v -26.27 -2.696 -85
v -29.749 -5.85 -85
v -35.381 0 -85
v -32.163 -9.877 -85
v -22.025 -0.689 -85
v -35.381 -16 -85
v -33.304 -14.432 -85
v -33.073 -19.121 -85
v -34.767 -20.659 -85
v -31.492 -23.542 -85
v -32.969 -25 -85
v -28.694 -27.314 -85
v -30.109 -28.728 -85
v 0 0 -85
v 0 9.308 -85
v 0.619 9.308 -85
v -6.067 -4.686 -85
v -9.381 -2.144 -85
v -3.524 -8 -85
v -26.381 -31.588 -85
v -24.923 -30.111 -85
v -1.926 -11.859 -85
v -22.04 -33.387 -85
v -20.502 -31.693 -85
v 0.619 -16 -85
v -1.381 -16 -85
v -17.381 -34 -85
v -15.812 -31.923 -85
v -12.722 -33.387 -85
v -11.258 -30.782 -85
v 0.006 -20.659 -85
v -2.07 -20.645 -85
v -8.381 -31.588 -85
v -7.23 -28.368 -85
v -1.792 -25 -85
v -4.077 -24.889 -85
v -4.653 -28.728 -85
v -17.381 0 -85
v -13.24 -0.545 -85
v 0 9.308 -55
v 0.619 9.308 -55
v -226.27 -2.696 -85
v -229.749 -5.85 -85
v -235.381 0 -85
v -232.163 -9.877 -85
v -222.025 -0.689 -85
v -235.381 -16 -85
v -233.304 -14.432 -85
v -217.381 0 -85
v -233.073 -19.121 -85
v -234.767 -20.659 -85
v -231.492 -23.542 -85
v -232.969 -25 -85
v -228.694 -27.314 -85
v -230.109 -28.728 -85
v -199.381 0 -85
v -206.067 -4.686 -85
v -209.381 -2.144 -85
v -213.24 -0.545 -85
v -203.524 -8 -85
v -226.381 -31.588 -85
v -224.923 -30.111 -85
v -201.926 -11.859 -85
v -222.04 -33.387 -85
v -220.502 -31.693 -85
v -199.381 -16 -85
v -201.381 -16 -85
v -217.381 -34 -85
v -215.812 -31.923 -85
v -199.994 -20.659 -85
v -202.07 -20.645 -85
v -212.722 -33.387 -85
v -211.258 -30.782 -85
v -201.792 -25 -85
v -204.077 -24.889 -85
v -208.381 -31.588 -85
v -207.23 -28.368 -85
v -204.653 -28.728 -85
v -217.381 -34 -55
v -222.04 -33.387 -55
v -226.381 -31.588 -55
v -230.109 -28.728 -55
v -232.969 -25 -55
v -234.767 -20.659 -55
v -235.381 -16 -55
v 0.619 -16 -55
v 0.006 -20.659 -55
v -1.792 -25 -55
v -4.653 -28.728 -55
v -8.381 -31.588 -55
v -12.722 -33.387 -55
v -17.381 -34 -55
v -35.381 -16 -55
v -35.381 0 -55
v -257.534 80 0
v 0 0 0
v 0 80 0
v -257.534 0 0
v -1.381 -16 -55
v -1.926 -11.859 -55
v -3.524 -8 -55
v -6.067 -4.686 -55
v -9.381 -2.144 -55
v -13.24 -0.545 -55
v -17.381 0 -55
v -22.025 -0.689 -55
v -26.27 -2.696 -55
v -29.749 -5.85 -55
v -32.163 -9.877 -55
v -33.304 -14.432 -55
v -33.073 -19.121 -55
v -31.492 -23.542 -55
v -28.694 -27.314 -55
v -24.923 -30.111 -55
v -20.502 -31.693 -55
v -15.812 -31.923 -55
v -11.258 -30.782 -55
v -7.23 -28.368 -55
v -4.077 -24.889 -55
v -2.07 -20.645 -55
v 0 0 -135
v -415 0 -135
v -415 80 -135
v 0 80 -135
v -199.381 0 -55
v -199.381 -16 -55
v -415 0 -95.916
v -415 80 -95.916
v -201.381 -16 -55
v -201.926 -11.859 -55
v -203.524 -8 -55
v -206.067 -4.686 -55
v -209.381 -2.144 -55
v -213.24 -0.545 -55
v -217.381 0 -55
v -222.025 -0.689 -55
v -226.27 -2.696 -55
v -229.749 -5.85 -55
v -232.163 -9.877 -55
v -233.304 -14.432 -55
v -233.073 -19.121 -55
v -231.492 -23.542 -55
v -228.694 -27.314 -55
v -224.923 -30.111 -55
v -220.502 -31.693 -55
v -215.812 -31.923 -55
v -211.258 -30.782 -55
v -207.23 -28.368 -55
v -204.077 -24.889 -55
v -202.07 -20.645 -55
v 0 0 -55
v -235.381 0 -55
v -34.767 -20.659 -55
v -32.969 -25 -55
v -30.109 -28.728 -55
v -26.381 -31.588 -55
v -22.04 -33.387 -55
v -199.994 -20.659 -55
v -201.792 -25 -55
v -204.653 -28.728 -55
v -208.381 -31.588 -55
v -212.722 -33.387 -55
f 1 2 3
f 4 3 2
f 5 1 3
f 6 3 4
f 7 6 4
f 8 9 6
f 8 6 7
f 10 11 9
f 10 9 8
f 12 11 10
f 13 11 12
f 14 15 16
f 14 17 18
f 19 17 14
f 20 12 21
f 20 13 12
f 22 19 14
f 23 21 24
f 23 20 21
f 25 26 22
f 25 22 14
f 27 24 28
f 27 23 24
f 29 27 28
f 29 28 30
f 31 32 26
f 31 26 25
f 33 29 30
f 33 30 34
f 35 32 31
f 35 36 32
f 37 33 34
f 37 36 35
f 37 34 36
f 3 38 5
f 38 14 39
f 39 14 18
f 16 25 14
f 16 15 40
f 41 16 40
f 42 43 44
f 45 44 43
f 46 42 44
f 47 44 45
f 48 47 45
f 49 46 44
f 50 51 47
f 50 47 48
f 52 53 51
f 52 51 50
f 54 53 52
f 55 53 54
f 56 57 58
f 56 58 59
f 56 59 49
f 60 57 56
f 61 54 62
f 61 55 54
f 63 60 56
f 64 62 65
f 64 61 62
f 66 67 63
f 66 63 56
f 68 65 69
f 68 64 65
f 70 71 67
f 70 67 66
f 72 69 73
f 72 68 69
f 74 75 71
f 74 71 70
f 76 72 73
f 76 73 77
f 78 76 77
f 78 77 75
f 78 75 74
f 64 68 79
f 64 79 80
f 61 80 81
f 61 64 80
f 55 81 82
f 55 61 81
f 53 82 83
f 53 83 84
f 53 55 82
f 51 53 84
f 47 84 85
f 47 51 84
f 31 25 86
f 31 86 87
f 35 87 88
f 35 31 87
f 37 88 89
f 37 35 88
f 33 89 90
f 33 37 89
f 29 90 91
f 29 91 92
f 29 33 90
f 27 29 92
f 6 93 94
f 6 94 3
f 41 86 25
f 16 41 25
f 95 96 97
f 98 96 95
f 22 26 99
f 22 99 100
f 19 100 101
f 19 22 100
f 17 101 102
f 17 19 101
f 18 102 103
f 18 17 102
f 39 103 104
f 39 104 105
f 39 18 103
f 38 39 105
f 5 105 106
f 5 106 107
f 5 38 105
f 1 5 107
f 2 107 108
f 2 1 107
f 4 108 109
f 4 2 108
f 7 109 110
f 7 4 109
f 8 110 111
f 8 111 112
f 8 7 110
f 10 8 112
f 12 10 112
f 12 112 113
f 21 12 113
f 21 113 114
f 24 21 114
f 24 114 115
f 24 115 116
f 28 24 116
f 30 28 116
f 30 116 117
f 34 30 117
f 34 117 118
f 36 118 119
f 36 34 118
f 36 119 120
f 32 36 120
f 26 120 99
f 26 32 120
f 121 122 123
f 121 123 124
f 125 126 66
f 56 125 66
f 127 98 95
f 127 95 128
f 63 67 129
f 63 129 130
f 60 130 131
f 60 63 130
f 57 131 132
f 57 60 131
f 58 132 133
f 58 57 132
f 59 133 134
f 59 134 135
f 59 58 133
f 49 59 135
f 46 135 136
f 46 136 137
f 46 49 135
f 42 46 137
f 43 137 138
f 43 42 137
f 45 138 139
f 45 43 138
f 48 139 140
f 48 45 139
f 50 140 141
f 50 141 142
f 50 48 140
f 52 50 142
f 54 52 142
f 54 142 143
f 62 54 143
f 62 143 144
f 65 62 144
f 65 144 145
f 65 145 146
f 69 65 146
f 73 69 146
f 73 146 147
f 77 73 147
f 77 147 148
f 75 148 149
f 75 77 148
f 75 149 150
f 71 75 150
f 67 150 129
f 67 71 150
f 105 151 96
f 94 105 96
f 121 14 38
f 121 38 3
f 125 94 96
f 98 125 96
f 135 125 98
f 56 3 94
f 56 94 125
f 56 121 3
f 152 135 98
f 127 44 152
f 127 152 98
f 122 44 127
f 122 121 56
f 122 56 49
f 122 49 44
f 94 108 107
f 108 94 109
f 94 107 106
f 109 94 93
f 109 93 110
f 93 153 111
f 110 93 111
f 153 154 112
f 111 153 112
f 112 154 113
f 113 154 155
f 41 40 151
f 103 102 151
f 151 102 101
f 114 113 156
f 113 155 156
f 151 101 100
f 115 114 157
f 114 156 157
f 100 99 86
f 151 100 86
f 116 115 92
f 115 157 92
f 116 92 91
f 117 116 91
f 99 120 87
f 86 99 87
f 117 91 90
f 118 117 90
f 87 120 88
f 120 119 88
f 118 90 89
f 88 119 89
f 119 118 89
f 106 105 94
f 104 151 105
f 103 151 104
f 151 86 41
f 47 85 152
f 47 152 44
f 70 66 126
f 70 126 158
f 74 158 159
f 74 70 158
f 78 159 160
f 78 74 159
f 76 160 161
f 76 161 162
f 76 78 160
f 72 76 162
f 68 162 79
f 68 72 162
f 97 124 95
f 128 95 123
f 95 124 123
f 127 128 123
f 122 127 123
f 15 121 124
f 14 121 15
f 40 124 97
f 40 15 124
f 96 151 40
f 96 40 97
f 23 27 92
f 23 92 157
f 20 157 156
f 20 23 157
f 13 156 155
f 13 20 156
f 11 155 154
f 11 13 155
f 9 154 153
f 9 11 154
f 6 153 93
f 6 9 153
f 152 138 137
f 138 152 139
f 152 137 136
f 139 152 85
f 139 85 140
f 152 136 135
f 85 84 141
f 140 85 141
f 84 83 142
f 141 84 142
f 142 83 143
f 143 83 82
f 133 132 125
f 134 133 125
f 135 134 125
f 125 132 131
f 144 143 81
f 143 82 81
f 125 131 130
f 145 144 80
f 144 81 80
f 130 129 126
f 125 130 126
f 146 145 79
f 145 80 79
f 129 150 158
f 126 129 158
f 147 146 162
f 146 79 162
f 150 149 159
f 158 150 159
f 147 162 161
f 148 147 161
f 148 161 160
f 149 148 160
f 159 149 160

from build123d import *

# Parameters (mm, degrees)
Y_KSEKLIK_EKSTR_ZYON1_DEPTH = 80
Y_KSEKLIK_EKSTR_ZYON6_START = -50
IZIM4_R                     = 16
Y_KSEKLIK_EKSTR_ZYON6_DEPTH = 30


with BuildPart() as part:
    # Çizim3 → Yükseklik-Ekstrüzyon1 (new body)
    with BuildSketch(Plane(origin=(0, 0, 0), x_dir=(1, 0, 0), z_dir=(0, 1, 0))):
        Polygon((-257.534328512, 0.000206653), (-415, 95.915871832), (-415, 135), (0, 135), (0, 0), align=None)
    extrude(amount=Y_KSEKLIK_EKSTR_ZYON1_DEPTH)

    # Çizim4 → Yükseklik-Ekstrüzyon6 (add)
    # profile 1 of 2: a face of its own
    with BuildSketch(Plane(origin=(0, 0, -135), x_dir=(-1, 0, 0), z_dir=(0, 0, -1)).offset(Y_KSEKLIK_EKSTR_ZYON6_START)):
        with BuildLine():
            Line((199.380767456, 11.253885018), (199.380767456, -16))
            ThreePointArc((199.380767456, -16), (217.380767456, -34), (235.380767456, -16))
            Line((235.380767456, -16), (235.380767456, 11.253885018))
            Line((235.380767456, 11.253885018), (199.380767456, 11.253885018))
        make_face()
        with Locations((217.380767456, -16)):
            Circle(IZIM4_R, mode=Mode.SUBTRACT)
    # profile 2 of 2: a face of its own
    with BuildSketch(Plane(origin=(0, 0, -135), x_dir=(-1, 0, 0), z_dir=(0, 0, -1)).offset(Y_KSEKLIK_EKSTR_ZYON6_START)):
        with BuildLine():
            Line((-0.619232544, 9.307663541), (-0.619232544, -16))
            ThreePointArc((-0.619232544, -16), (17.380767456, -34), (35.380767456, -16))
            Line((35.380767456, -16), (35.380767456, 9.307663541))
            Line((35.380767456, 9.307663541), (-0.619232544, 9.307663541))
        make_face()
        with Locations((17.380767456, -16)):
            Circle(IZIM4_R, mode=Mode.SUBTRACT)
    extrude(amount=-Y_KSEKLIK_EKSTR_ZYON6_DEPTH)


solid = part.part
